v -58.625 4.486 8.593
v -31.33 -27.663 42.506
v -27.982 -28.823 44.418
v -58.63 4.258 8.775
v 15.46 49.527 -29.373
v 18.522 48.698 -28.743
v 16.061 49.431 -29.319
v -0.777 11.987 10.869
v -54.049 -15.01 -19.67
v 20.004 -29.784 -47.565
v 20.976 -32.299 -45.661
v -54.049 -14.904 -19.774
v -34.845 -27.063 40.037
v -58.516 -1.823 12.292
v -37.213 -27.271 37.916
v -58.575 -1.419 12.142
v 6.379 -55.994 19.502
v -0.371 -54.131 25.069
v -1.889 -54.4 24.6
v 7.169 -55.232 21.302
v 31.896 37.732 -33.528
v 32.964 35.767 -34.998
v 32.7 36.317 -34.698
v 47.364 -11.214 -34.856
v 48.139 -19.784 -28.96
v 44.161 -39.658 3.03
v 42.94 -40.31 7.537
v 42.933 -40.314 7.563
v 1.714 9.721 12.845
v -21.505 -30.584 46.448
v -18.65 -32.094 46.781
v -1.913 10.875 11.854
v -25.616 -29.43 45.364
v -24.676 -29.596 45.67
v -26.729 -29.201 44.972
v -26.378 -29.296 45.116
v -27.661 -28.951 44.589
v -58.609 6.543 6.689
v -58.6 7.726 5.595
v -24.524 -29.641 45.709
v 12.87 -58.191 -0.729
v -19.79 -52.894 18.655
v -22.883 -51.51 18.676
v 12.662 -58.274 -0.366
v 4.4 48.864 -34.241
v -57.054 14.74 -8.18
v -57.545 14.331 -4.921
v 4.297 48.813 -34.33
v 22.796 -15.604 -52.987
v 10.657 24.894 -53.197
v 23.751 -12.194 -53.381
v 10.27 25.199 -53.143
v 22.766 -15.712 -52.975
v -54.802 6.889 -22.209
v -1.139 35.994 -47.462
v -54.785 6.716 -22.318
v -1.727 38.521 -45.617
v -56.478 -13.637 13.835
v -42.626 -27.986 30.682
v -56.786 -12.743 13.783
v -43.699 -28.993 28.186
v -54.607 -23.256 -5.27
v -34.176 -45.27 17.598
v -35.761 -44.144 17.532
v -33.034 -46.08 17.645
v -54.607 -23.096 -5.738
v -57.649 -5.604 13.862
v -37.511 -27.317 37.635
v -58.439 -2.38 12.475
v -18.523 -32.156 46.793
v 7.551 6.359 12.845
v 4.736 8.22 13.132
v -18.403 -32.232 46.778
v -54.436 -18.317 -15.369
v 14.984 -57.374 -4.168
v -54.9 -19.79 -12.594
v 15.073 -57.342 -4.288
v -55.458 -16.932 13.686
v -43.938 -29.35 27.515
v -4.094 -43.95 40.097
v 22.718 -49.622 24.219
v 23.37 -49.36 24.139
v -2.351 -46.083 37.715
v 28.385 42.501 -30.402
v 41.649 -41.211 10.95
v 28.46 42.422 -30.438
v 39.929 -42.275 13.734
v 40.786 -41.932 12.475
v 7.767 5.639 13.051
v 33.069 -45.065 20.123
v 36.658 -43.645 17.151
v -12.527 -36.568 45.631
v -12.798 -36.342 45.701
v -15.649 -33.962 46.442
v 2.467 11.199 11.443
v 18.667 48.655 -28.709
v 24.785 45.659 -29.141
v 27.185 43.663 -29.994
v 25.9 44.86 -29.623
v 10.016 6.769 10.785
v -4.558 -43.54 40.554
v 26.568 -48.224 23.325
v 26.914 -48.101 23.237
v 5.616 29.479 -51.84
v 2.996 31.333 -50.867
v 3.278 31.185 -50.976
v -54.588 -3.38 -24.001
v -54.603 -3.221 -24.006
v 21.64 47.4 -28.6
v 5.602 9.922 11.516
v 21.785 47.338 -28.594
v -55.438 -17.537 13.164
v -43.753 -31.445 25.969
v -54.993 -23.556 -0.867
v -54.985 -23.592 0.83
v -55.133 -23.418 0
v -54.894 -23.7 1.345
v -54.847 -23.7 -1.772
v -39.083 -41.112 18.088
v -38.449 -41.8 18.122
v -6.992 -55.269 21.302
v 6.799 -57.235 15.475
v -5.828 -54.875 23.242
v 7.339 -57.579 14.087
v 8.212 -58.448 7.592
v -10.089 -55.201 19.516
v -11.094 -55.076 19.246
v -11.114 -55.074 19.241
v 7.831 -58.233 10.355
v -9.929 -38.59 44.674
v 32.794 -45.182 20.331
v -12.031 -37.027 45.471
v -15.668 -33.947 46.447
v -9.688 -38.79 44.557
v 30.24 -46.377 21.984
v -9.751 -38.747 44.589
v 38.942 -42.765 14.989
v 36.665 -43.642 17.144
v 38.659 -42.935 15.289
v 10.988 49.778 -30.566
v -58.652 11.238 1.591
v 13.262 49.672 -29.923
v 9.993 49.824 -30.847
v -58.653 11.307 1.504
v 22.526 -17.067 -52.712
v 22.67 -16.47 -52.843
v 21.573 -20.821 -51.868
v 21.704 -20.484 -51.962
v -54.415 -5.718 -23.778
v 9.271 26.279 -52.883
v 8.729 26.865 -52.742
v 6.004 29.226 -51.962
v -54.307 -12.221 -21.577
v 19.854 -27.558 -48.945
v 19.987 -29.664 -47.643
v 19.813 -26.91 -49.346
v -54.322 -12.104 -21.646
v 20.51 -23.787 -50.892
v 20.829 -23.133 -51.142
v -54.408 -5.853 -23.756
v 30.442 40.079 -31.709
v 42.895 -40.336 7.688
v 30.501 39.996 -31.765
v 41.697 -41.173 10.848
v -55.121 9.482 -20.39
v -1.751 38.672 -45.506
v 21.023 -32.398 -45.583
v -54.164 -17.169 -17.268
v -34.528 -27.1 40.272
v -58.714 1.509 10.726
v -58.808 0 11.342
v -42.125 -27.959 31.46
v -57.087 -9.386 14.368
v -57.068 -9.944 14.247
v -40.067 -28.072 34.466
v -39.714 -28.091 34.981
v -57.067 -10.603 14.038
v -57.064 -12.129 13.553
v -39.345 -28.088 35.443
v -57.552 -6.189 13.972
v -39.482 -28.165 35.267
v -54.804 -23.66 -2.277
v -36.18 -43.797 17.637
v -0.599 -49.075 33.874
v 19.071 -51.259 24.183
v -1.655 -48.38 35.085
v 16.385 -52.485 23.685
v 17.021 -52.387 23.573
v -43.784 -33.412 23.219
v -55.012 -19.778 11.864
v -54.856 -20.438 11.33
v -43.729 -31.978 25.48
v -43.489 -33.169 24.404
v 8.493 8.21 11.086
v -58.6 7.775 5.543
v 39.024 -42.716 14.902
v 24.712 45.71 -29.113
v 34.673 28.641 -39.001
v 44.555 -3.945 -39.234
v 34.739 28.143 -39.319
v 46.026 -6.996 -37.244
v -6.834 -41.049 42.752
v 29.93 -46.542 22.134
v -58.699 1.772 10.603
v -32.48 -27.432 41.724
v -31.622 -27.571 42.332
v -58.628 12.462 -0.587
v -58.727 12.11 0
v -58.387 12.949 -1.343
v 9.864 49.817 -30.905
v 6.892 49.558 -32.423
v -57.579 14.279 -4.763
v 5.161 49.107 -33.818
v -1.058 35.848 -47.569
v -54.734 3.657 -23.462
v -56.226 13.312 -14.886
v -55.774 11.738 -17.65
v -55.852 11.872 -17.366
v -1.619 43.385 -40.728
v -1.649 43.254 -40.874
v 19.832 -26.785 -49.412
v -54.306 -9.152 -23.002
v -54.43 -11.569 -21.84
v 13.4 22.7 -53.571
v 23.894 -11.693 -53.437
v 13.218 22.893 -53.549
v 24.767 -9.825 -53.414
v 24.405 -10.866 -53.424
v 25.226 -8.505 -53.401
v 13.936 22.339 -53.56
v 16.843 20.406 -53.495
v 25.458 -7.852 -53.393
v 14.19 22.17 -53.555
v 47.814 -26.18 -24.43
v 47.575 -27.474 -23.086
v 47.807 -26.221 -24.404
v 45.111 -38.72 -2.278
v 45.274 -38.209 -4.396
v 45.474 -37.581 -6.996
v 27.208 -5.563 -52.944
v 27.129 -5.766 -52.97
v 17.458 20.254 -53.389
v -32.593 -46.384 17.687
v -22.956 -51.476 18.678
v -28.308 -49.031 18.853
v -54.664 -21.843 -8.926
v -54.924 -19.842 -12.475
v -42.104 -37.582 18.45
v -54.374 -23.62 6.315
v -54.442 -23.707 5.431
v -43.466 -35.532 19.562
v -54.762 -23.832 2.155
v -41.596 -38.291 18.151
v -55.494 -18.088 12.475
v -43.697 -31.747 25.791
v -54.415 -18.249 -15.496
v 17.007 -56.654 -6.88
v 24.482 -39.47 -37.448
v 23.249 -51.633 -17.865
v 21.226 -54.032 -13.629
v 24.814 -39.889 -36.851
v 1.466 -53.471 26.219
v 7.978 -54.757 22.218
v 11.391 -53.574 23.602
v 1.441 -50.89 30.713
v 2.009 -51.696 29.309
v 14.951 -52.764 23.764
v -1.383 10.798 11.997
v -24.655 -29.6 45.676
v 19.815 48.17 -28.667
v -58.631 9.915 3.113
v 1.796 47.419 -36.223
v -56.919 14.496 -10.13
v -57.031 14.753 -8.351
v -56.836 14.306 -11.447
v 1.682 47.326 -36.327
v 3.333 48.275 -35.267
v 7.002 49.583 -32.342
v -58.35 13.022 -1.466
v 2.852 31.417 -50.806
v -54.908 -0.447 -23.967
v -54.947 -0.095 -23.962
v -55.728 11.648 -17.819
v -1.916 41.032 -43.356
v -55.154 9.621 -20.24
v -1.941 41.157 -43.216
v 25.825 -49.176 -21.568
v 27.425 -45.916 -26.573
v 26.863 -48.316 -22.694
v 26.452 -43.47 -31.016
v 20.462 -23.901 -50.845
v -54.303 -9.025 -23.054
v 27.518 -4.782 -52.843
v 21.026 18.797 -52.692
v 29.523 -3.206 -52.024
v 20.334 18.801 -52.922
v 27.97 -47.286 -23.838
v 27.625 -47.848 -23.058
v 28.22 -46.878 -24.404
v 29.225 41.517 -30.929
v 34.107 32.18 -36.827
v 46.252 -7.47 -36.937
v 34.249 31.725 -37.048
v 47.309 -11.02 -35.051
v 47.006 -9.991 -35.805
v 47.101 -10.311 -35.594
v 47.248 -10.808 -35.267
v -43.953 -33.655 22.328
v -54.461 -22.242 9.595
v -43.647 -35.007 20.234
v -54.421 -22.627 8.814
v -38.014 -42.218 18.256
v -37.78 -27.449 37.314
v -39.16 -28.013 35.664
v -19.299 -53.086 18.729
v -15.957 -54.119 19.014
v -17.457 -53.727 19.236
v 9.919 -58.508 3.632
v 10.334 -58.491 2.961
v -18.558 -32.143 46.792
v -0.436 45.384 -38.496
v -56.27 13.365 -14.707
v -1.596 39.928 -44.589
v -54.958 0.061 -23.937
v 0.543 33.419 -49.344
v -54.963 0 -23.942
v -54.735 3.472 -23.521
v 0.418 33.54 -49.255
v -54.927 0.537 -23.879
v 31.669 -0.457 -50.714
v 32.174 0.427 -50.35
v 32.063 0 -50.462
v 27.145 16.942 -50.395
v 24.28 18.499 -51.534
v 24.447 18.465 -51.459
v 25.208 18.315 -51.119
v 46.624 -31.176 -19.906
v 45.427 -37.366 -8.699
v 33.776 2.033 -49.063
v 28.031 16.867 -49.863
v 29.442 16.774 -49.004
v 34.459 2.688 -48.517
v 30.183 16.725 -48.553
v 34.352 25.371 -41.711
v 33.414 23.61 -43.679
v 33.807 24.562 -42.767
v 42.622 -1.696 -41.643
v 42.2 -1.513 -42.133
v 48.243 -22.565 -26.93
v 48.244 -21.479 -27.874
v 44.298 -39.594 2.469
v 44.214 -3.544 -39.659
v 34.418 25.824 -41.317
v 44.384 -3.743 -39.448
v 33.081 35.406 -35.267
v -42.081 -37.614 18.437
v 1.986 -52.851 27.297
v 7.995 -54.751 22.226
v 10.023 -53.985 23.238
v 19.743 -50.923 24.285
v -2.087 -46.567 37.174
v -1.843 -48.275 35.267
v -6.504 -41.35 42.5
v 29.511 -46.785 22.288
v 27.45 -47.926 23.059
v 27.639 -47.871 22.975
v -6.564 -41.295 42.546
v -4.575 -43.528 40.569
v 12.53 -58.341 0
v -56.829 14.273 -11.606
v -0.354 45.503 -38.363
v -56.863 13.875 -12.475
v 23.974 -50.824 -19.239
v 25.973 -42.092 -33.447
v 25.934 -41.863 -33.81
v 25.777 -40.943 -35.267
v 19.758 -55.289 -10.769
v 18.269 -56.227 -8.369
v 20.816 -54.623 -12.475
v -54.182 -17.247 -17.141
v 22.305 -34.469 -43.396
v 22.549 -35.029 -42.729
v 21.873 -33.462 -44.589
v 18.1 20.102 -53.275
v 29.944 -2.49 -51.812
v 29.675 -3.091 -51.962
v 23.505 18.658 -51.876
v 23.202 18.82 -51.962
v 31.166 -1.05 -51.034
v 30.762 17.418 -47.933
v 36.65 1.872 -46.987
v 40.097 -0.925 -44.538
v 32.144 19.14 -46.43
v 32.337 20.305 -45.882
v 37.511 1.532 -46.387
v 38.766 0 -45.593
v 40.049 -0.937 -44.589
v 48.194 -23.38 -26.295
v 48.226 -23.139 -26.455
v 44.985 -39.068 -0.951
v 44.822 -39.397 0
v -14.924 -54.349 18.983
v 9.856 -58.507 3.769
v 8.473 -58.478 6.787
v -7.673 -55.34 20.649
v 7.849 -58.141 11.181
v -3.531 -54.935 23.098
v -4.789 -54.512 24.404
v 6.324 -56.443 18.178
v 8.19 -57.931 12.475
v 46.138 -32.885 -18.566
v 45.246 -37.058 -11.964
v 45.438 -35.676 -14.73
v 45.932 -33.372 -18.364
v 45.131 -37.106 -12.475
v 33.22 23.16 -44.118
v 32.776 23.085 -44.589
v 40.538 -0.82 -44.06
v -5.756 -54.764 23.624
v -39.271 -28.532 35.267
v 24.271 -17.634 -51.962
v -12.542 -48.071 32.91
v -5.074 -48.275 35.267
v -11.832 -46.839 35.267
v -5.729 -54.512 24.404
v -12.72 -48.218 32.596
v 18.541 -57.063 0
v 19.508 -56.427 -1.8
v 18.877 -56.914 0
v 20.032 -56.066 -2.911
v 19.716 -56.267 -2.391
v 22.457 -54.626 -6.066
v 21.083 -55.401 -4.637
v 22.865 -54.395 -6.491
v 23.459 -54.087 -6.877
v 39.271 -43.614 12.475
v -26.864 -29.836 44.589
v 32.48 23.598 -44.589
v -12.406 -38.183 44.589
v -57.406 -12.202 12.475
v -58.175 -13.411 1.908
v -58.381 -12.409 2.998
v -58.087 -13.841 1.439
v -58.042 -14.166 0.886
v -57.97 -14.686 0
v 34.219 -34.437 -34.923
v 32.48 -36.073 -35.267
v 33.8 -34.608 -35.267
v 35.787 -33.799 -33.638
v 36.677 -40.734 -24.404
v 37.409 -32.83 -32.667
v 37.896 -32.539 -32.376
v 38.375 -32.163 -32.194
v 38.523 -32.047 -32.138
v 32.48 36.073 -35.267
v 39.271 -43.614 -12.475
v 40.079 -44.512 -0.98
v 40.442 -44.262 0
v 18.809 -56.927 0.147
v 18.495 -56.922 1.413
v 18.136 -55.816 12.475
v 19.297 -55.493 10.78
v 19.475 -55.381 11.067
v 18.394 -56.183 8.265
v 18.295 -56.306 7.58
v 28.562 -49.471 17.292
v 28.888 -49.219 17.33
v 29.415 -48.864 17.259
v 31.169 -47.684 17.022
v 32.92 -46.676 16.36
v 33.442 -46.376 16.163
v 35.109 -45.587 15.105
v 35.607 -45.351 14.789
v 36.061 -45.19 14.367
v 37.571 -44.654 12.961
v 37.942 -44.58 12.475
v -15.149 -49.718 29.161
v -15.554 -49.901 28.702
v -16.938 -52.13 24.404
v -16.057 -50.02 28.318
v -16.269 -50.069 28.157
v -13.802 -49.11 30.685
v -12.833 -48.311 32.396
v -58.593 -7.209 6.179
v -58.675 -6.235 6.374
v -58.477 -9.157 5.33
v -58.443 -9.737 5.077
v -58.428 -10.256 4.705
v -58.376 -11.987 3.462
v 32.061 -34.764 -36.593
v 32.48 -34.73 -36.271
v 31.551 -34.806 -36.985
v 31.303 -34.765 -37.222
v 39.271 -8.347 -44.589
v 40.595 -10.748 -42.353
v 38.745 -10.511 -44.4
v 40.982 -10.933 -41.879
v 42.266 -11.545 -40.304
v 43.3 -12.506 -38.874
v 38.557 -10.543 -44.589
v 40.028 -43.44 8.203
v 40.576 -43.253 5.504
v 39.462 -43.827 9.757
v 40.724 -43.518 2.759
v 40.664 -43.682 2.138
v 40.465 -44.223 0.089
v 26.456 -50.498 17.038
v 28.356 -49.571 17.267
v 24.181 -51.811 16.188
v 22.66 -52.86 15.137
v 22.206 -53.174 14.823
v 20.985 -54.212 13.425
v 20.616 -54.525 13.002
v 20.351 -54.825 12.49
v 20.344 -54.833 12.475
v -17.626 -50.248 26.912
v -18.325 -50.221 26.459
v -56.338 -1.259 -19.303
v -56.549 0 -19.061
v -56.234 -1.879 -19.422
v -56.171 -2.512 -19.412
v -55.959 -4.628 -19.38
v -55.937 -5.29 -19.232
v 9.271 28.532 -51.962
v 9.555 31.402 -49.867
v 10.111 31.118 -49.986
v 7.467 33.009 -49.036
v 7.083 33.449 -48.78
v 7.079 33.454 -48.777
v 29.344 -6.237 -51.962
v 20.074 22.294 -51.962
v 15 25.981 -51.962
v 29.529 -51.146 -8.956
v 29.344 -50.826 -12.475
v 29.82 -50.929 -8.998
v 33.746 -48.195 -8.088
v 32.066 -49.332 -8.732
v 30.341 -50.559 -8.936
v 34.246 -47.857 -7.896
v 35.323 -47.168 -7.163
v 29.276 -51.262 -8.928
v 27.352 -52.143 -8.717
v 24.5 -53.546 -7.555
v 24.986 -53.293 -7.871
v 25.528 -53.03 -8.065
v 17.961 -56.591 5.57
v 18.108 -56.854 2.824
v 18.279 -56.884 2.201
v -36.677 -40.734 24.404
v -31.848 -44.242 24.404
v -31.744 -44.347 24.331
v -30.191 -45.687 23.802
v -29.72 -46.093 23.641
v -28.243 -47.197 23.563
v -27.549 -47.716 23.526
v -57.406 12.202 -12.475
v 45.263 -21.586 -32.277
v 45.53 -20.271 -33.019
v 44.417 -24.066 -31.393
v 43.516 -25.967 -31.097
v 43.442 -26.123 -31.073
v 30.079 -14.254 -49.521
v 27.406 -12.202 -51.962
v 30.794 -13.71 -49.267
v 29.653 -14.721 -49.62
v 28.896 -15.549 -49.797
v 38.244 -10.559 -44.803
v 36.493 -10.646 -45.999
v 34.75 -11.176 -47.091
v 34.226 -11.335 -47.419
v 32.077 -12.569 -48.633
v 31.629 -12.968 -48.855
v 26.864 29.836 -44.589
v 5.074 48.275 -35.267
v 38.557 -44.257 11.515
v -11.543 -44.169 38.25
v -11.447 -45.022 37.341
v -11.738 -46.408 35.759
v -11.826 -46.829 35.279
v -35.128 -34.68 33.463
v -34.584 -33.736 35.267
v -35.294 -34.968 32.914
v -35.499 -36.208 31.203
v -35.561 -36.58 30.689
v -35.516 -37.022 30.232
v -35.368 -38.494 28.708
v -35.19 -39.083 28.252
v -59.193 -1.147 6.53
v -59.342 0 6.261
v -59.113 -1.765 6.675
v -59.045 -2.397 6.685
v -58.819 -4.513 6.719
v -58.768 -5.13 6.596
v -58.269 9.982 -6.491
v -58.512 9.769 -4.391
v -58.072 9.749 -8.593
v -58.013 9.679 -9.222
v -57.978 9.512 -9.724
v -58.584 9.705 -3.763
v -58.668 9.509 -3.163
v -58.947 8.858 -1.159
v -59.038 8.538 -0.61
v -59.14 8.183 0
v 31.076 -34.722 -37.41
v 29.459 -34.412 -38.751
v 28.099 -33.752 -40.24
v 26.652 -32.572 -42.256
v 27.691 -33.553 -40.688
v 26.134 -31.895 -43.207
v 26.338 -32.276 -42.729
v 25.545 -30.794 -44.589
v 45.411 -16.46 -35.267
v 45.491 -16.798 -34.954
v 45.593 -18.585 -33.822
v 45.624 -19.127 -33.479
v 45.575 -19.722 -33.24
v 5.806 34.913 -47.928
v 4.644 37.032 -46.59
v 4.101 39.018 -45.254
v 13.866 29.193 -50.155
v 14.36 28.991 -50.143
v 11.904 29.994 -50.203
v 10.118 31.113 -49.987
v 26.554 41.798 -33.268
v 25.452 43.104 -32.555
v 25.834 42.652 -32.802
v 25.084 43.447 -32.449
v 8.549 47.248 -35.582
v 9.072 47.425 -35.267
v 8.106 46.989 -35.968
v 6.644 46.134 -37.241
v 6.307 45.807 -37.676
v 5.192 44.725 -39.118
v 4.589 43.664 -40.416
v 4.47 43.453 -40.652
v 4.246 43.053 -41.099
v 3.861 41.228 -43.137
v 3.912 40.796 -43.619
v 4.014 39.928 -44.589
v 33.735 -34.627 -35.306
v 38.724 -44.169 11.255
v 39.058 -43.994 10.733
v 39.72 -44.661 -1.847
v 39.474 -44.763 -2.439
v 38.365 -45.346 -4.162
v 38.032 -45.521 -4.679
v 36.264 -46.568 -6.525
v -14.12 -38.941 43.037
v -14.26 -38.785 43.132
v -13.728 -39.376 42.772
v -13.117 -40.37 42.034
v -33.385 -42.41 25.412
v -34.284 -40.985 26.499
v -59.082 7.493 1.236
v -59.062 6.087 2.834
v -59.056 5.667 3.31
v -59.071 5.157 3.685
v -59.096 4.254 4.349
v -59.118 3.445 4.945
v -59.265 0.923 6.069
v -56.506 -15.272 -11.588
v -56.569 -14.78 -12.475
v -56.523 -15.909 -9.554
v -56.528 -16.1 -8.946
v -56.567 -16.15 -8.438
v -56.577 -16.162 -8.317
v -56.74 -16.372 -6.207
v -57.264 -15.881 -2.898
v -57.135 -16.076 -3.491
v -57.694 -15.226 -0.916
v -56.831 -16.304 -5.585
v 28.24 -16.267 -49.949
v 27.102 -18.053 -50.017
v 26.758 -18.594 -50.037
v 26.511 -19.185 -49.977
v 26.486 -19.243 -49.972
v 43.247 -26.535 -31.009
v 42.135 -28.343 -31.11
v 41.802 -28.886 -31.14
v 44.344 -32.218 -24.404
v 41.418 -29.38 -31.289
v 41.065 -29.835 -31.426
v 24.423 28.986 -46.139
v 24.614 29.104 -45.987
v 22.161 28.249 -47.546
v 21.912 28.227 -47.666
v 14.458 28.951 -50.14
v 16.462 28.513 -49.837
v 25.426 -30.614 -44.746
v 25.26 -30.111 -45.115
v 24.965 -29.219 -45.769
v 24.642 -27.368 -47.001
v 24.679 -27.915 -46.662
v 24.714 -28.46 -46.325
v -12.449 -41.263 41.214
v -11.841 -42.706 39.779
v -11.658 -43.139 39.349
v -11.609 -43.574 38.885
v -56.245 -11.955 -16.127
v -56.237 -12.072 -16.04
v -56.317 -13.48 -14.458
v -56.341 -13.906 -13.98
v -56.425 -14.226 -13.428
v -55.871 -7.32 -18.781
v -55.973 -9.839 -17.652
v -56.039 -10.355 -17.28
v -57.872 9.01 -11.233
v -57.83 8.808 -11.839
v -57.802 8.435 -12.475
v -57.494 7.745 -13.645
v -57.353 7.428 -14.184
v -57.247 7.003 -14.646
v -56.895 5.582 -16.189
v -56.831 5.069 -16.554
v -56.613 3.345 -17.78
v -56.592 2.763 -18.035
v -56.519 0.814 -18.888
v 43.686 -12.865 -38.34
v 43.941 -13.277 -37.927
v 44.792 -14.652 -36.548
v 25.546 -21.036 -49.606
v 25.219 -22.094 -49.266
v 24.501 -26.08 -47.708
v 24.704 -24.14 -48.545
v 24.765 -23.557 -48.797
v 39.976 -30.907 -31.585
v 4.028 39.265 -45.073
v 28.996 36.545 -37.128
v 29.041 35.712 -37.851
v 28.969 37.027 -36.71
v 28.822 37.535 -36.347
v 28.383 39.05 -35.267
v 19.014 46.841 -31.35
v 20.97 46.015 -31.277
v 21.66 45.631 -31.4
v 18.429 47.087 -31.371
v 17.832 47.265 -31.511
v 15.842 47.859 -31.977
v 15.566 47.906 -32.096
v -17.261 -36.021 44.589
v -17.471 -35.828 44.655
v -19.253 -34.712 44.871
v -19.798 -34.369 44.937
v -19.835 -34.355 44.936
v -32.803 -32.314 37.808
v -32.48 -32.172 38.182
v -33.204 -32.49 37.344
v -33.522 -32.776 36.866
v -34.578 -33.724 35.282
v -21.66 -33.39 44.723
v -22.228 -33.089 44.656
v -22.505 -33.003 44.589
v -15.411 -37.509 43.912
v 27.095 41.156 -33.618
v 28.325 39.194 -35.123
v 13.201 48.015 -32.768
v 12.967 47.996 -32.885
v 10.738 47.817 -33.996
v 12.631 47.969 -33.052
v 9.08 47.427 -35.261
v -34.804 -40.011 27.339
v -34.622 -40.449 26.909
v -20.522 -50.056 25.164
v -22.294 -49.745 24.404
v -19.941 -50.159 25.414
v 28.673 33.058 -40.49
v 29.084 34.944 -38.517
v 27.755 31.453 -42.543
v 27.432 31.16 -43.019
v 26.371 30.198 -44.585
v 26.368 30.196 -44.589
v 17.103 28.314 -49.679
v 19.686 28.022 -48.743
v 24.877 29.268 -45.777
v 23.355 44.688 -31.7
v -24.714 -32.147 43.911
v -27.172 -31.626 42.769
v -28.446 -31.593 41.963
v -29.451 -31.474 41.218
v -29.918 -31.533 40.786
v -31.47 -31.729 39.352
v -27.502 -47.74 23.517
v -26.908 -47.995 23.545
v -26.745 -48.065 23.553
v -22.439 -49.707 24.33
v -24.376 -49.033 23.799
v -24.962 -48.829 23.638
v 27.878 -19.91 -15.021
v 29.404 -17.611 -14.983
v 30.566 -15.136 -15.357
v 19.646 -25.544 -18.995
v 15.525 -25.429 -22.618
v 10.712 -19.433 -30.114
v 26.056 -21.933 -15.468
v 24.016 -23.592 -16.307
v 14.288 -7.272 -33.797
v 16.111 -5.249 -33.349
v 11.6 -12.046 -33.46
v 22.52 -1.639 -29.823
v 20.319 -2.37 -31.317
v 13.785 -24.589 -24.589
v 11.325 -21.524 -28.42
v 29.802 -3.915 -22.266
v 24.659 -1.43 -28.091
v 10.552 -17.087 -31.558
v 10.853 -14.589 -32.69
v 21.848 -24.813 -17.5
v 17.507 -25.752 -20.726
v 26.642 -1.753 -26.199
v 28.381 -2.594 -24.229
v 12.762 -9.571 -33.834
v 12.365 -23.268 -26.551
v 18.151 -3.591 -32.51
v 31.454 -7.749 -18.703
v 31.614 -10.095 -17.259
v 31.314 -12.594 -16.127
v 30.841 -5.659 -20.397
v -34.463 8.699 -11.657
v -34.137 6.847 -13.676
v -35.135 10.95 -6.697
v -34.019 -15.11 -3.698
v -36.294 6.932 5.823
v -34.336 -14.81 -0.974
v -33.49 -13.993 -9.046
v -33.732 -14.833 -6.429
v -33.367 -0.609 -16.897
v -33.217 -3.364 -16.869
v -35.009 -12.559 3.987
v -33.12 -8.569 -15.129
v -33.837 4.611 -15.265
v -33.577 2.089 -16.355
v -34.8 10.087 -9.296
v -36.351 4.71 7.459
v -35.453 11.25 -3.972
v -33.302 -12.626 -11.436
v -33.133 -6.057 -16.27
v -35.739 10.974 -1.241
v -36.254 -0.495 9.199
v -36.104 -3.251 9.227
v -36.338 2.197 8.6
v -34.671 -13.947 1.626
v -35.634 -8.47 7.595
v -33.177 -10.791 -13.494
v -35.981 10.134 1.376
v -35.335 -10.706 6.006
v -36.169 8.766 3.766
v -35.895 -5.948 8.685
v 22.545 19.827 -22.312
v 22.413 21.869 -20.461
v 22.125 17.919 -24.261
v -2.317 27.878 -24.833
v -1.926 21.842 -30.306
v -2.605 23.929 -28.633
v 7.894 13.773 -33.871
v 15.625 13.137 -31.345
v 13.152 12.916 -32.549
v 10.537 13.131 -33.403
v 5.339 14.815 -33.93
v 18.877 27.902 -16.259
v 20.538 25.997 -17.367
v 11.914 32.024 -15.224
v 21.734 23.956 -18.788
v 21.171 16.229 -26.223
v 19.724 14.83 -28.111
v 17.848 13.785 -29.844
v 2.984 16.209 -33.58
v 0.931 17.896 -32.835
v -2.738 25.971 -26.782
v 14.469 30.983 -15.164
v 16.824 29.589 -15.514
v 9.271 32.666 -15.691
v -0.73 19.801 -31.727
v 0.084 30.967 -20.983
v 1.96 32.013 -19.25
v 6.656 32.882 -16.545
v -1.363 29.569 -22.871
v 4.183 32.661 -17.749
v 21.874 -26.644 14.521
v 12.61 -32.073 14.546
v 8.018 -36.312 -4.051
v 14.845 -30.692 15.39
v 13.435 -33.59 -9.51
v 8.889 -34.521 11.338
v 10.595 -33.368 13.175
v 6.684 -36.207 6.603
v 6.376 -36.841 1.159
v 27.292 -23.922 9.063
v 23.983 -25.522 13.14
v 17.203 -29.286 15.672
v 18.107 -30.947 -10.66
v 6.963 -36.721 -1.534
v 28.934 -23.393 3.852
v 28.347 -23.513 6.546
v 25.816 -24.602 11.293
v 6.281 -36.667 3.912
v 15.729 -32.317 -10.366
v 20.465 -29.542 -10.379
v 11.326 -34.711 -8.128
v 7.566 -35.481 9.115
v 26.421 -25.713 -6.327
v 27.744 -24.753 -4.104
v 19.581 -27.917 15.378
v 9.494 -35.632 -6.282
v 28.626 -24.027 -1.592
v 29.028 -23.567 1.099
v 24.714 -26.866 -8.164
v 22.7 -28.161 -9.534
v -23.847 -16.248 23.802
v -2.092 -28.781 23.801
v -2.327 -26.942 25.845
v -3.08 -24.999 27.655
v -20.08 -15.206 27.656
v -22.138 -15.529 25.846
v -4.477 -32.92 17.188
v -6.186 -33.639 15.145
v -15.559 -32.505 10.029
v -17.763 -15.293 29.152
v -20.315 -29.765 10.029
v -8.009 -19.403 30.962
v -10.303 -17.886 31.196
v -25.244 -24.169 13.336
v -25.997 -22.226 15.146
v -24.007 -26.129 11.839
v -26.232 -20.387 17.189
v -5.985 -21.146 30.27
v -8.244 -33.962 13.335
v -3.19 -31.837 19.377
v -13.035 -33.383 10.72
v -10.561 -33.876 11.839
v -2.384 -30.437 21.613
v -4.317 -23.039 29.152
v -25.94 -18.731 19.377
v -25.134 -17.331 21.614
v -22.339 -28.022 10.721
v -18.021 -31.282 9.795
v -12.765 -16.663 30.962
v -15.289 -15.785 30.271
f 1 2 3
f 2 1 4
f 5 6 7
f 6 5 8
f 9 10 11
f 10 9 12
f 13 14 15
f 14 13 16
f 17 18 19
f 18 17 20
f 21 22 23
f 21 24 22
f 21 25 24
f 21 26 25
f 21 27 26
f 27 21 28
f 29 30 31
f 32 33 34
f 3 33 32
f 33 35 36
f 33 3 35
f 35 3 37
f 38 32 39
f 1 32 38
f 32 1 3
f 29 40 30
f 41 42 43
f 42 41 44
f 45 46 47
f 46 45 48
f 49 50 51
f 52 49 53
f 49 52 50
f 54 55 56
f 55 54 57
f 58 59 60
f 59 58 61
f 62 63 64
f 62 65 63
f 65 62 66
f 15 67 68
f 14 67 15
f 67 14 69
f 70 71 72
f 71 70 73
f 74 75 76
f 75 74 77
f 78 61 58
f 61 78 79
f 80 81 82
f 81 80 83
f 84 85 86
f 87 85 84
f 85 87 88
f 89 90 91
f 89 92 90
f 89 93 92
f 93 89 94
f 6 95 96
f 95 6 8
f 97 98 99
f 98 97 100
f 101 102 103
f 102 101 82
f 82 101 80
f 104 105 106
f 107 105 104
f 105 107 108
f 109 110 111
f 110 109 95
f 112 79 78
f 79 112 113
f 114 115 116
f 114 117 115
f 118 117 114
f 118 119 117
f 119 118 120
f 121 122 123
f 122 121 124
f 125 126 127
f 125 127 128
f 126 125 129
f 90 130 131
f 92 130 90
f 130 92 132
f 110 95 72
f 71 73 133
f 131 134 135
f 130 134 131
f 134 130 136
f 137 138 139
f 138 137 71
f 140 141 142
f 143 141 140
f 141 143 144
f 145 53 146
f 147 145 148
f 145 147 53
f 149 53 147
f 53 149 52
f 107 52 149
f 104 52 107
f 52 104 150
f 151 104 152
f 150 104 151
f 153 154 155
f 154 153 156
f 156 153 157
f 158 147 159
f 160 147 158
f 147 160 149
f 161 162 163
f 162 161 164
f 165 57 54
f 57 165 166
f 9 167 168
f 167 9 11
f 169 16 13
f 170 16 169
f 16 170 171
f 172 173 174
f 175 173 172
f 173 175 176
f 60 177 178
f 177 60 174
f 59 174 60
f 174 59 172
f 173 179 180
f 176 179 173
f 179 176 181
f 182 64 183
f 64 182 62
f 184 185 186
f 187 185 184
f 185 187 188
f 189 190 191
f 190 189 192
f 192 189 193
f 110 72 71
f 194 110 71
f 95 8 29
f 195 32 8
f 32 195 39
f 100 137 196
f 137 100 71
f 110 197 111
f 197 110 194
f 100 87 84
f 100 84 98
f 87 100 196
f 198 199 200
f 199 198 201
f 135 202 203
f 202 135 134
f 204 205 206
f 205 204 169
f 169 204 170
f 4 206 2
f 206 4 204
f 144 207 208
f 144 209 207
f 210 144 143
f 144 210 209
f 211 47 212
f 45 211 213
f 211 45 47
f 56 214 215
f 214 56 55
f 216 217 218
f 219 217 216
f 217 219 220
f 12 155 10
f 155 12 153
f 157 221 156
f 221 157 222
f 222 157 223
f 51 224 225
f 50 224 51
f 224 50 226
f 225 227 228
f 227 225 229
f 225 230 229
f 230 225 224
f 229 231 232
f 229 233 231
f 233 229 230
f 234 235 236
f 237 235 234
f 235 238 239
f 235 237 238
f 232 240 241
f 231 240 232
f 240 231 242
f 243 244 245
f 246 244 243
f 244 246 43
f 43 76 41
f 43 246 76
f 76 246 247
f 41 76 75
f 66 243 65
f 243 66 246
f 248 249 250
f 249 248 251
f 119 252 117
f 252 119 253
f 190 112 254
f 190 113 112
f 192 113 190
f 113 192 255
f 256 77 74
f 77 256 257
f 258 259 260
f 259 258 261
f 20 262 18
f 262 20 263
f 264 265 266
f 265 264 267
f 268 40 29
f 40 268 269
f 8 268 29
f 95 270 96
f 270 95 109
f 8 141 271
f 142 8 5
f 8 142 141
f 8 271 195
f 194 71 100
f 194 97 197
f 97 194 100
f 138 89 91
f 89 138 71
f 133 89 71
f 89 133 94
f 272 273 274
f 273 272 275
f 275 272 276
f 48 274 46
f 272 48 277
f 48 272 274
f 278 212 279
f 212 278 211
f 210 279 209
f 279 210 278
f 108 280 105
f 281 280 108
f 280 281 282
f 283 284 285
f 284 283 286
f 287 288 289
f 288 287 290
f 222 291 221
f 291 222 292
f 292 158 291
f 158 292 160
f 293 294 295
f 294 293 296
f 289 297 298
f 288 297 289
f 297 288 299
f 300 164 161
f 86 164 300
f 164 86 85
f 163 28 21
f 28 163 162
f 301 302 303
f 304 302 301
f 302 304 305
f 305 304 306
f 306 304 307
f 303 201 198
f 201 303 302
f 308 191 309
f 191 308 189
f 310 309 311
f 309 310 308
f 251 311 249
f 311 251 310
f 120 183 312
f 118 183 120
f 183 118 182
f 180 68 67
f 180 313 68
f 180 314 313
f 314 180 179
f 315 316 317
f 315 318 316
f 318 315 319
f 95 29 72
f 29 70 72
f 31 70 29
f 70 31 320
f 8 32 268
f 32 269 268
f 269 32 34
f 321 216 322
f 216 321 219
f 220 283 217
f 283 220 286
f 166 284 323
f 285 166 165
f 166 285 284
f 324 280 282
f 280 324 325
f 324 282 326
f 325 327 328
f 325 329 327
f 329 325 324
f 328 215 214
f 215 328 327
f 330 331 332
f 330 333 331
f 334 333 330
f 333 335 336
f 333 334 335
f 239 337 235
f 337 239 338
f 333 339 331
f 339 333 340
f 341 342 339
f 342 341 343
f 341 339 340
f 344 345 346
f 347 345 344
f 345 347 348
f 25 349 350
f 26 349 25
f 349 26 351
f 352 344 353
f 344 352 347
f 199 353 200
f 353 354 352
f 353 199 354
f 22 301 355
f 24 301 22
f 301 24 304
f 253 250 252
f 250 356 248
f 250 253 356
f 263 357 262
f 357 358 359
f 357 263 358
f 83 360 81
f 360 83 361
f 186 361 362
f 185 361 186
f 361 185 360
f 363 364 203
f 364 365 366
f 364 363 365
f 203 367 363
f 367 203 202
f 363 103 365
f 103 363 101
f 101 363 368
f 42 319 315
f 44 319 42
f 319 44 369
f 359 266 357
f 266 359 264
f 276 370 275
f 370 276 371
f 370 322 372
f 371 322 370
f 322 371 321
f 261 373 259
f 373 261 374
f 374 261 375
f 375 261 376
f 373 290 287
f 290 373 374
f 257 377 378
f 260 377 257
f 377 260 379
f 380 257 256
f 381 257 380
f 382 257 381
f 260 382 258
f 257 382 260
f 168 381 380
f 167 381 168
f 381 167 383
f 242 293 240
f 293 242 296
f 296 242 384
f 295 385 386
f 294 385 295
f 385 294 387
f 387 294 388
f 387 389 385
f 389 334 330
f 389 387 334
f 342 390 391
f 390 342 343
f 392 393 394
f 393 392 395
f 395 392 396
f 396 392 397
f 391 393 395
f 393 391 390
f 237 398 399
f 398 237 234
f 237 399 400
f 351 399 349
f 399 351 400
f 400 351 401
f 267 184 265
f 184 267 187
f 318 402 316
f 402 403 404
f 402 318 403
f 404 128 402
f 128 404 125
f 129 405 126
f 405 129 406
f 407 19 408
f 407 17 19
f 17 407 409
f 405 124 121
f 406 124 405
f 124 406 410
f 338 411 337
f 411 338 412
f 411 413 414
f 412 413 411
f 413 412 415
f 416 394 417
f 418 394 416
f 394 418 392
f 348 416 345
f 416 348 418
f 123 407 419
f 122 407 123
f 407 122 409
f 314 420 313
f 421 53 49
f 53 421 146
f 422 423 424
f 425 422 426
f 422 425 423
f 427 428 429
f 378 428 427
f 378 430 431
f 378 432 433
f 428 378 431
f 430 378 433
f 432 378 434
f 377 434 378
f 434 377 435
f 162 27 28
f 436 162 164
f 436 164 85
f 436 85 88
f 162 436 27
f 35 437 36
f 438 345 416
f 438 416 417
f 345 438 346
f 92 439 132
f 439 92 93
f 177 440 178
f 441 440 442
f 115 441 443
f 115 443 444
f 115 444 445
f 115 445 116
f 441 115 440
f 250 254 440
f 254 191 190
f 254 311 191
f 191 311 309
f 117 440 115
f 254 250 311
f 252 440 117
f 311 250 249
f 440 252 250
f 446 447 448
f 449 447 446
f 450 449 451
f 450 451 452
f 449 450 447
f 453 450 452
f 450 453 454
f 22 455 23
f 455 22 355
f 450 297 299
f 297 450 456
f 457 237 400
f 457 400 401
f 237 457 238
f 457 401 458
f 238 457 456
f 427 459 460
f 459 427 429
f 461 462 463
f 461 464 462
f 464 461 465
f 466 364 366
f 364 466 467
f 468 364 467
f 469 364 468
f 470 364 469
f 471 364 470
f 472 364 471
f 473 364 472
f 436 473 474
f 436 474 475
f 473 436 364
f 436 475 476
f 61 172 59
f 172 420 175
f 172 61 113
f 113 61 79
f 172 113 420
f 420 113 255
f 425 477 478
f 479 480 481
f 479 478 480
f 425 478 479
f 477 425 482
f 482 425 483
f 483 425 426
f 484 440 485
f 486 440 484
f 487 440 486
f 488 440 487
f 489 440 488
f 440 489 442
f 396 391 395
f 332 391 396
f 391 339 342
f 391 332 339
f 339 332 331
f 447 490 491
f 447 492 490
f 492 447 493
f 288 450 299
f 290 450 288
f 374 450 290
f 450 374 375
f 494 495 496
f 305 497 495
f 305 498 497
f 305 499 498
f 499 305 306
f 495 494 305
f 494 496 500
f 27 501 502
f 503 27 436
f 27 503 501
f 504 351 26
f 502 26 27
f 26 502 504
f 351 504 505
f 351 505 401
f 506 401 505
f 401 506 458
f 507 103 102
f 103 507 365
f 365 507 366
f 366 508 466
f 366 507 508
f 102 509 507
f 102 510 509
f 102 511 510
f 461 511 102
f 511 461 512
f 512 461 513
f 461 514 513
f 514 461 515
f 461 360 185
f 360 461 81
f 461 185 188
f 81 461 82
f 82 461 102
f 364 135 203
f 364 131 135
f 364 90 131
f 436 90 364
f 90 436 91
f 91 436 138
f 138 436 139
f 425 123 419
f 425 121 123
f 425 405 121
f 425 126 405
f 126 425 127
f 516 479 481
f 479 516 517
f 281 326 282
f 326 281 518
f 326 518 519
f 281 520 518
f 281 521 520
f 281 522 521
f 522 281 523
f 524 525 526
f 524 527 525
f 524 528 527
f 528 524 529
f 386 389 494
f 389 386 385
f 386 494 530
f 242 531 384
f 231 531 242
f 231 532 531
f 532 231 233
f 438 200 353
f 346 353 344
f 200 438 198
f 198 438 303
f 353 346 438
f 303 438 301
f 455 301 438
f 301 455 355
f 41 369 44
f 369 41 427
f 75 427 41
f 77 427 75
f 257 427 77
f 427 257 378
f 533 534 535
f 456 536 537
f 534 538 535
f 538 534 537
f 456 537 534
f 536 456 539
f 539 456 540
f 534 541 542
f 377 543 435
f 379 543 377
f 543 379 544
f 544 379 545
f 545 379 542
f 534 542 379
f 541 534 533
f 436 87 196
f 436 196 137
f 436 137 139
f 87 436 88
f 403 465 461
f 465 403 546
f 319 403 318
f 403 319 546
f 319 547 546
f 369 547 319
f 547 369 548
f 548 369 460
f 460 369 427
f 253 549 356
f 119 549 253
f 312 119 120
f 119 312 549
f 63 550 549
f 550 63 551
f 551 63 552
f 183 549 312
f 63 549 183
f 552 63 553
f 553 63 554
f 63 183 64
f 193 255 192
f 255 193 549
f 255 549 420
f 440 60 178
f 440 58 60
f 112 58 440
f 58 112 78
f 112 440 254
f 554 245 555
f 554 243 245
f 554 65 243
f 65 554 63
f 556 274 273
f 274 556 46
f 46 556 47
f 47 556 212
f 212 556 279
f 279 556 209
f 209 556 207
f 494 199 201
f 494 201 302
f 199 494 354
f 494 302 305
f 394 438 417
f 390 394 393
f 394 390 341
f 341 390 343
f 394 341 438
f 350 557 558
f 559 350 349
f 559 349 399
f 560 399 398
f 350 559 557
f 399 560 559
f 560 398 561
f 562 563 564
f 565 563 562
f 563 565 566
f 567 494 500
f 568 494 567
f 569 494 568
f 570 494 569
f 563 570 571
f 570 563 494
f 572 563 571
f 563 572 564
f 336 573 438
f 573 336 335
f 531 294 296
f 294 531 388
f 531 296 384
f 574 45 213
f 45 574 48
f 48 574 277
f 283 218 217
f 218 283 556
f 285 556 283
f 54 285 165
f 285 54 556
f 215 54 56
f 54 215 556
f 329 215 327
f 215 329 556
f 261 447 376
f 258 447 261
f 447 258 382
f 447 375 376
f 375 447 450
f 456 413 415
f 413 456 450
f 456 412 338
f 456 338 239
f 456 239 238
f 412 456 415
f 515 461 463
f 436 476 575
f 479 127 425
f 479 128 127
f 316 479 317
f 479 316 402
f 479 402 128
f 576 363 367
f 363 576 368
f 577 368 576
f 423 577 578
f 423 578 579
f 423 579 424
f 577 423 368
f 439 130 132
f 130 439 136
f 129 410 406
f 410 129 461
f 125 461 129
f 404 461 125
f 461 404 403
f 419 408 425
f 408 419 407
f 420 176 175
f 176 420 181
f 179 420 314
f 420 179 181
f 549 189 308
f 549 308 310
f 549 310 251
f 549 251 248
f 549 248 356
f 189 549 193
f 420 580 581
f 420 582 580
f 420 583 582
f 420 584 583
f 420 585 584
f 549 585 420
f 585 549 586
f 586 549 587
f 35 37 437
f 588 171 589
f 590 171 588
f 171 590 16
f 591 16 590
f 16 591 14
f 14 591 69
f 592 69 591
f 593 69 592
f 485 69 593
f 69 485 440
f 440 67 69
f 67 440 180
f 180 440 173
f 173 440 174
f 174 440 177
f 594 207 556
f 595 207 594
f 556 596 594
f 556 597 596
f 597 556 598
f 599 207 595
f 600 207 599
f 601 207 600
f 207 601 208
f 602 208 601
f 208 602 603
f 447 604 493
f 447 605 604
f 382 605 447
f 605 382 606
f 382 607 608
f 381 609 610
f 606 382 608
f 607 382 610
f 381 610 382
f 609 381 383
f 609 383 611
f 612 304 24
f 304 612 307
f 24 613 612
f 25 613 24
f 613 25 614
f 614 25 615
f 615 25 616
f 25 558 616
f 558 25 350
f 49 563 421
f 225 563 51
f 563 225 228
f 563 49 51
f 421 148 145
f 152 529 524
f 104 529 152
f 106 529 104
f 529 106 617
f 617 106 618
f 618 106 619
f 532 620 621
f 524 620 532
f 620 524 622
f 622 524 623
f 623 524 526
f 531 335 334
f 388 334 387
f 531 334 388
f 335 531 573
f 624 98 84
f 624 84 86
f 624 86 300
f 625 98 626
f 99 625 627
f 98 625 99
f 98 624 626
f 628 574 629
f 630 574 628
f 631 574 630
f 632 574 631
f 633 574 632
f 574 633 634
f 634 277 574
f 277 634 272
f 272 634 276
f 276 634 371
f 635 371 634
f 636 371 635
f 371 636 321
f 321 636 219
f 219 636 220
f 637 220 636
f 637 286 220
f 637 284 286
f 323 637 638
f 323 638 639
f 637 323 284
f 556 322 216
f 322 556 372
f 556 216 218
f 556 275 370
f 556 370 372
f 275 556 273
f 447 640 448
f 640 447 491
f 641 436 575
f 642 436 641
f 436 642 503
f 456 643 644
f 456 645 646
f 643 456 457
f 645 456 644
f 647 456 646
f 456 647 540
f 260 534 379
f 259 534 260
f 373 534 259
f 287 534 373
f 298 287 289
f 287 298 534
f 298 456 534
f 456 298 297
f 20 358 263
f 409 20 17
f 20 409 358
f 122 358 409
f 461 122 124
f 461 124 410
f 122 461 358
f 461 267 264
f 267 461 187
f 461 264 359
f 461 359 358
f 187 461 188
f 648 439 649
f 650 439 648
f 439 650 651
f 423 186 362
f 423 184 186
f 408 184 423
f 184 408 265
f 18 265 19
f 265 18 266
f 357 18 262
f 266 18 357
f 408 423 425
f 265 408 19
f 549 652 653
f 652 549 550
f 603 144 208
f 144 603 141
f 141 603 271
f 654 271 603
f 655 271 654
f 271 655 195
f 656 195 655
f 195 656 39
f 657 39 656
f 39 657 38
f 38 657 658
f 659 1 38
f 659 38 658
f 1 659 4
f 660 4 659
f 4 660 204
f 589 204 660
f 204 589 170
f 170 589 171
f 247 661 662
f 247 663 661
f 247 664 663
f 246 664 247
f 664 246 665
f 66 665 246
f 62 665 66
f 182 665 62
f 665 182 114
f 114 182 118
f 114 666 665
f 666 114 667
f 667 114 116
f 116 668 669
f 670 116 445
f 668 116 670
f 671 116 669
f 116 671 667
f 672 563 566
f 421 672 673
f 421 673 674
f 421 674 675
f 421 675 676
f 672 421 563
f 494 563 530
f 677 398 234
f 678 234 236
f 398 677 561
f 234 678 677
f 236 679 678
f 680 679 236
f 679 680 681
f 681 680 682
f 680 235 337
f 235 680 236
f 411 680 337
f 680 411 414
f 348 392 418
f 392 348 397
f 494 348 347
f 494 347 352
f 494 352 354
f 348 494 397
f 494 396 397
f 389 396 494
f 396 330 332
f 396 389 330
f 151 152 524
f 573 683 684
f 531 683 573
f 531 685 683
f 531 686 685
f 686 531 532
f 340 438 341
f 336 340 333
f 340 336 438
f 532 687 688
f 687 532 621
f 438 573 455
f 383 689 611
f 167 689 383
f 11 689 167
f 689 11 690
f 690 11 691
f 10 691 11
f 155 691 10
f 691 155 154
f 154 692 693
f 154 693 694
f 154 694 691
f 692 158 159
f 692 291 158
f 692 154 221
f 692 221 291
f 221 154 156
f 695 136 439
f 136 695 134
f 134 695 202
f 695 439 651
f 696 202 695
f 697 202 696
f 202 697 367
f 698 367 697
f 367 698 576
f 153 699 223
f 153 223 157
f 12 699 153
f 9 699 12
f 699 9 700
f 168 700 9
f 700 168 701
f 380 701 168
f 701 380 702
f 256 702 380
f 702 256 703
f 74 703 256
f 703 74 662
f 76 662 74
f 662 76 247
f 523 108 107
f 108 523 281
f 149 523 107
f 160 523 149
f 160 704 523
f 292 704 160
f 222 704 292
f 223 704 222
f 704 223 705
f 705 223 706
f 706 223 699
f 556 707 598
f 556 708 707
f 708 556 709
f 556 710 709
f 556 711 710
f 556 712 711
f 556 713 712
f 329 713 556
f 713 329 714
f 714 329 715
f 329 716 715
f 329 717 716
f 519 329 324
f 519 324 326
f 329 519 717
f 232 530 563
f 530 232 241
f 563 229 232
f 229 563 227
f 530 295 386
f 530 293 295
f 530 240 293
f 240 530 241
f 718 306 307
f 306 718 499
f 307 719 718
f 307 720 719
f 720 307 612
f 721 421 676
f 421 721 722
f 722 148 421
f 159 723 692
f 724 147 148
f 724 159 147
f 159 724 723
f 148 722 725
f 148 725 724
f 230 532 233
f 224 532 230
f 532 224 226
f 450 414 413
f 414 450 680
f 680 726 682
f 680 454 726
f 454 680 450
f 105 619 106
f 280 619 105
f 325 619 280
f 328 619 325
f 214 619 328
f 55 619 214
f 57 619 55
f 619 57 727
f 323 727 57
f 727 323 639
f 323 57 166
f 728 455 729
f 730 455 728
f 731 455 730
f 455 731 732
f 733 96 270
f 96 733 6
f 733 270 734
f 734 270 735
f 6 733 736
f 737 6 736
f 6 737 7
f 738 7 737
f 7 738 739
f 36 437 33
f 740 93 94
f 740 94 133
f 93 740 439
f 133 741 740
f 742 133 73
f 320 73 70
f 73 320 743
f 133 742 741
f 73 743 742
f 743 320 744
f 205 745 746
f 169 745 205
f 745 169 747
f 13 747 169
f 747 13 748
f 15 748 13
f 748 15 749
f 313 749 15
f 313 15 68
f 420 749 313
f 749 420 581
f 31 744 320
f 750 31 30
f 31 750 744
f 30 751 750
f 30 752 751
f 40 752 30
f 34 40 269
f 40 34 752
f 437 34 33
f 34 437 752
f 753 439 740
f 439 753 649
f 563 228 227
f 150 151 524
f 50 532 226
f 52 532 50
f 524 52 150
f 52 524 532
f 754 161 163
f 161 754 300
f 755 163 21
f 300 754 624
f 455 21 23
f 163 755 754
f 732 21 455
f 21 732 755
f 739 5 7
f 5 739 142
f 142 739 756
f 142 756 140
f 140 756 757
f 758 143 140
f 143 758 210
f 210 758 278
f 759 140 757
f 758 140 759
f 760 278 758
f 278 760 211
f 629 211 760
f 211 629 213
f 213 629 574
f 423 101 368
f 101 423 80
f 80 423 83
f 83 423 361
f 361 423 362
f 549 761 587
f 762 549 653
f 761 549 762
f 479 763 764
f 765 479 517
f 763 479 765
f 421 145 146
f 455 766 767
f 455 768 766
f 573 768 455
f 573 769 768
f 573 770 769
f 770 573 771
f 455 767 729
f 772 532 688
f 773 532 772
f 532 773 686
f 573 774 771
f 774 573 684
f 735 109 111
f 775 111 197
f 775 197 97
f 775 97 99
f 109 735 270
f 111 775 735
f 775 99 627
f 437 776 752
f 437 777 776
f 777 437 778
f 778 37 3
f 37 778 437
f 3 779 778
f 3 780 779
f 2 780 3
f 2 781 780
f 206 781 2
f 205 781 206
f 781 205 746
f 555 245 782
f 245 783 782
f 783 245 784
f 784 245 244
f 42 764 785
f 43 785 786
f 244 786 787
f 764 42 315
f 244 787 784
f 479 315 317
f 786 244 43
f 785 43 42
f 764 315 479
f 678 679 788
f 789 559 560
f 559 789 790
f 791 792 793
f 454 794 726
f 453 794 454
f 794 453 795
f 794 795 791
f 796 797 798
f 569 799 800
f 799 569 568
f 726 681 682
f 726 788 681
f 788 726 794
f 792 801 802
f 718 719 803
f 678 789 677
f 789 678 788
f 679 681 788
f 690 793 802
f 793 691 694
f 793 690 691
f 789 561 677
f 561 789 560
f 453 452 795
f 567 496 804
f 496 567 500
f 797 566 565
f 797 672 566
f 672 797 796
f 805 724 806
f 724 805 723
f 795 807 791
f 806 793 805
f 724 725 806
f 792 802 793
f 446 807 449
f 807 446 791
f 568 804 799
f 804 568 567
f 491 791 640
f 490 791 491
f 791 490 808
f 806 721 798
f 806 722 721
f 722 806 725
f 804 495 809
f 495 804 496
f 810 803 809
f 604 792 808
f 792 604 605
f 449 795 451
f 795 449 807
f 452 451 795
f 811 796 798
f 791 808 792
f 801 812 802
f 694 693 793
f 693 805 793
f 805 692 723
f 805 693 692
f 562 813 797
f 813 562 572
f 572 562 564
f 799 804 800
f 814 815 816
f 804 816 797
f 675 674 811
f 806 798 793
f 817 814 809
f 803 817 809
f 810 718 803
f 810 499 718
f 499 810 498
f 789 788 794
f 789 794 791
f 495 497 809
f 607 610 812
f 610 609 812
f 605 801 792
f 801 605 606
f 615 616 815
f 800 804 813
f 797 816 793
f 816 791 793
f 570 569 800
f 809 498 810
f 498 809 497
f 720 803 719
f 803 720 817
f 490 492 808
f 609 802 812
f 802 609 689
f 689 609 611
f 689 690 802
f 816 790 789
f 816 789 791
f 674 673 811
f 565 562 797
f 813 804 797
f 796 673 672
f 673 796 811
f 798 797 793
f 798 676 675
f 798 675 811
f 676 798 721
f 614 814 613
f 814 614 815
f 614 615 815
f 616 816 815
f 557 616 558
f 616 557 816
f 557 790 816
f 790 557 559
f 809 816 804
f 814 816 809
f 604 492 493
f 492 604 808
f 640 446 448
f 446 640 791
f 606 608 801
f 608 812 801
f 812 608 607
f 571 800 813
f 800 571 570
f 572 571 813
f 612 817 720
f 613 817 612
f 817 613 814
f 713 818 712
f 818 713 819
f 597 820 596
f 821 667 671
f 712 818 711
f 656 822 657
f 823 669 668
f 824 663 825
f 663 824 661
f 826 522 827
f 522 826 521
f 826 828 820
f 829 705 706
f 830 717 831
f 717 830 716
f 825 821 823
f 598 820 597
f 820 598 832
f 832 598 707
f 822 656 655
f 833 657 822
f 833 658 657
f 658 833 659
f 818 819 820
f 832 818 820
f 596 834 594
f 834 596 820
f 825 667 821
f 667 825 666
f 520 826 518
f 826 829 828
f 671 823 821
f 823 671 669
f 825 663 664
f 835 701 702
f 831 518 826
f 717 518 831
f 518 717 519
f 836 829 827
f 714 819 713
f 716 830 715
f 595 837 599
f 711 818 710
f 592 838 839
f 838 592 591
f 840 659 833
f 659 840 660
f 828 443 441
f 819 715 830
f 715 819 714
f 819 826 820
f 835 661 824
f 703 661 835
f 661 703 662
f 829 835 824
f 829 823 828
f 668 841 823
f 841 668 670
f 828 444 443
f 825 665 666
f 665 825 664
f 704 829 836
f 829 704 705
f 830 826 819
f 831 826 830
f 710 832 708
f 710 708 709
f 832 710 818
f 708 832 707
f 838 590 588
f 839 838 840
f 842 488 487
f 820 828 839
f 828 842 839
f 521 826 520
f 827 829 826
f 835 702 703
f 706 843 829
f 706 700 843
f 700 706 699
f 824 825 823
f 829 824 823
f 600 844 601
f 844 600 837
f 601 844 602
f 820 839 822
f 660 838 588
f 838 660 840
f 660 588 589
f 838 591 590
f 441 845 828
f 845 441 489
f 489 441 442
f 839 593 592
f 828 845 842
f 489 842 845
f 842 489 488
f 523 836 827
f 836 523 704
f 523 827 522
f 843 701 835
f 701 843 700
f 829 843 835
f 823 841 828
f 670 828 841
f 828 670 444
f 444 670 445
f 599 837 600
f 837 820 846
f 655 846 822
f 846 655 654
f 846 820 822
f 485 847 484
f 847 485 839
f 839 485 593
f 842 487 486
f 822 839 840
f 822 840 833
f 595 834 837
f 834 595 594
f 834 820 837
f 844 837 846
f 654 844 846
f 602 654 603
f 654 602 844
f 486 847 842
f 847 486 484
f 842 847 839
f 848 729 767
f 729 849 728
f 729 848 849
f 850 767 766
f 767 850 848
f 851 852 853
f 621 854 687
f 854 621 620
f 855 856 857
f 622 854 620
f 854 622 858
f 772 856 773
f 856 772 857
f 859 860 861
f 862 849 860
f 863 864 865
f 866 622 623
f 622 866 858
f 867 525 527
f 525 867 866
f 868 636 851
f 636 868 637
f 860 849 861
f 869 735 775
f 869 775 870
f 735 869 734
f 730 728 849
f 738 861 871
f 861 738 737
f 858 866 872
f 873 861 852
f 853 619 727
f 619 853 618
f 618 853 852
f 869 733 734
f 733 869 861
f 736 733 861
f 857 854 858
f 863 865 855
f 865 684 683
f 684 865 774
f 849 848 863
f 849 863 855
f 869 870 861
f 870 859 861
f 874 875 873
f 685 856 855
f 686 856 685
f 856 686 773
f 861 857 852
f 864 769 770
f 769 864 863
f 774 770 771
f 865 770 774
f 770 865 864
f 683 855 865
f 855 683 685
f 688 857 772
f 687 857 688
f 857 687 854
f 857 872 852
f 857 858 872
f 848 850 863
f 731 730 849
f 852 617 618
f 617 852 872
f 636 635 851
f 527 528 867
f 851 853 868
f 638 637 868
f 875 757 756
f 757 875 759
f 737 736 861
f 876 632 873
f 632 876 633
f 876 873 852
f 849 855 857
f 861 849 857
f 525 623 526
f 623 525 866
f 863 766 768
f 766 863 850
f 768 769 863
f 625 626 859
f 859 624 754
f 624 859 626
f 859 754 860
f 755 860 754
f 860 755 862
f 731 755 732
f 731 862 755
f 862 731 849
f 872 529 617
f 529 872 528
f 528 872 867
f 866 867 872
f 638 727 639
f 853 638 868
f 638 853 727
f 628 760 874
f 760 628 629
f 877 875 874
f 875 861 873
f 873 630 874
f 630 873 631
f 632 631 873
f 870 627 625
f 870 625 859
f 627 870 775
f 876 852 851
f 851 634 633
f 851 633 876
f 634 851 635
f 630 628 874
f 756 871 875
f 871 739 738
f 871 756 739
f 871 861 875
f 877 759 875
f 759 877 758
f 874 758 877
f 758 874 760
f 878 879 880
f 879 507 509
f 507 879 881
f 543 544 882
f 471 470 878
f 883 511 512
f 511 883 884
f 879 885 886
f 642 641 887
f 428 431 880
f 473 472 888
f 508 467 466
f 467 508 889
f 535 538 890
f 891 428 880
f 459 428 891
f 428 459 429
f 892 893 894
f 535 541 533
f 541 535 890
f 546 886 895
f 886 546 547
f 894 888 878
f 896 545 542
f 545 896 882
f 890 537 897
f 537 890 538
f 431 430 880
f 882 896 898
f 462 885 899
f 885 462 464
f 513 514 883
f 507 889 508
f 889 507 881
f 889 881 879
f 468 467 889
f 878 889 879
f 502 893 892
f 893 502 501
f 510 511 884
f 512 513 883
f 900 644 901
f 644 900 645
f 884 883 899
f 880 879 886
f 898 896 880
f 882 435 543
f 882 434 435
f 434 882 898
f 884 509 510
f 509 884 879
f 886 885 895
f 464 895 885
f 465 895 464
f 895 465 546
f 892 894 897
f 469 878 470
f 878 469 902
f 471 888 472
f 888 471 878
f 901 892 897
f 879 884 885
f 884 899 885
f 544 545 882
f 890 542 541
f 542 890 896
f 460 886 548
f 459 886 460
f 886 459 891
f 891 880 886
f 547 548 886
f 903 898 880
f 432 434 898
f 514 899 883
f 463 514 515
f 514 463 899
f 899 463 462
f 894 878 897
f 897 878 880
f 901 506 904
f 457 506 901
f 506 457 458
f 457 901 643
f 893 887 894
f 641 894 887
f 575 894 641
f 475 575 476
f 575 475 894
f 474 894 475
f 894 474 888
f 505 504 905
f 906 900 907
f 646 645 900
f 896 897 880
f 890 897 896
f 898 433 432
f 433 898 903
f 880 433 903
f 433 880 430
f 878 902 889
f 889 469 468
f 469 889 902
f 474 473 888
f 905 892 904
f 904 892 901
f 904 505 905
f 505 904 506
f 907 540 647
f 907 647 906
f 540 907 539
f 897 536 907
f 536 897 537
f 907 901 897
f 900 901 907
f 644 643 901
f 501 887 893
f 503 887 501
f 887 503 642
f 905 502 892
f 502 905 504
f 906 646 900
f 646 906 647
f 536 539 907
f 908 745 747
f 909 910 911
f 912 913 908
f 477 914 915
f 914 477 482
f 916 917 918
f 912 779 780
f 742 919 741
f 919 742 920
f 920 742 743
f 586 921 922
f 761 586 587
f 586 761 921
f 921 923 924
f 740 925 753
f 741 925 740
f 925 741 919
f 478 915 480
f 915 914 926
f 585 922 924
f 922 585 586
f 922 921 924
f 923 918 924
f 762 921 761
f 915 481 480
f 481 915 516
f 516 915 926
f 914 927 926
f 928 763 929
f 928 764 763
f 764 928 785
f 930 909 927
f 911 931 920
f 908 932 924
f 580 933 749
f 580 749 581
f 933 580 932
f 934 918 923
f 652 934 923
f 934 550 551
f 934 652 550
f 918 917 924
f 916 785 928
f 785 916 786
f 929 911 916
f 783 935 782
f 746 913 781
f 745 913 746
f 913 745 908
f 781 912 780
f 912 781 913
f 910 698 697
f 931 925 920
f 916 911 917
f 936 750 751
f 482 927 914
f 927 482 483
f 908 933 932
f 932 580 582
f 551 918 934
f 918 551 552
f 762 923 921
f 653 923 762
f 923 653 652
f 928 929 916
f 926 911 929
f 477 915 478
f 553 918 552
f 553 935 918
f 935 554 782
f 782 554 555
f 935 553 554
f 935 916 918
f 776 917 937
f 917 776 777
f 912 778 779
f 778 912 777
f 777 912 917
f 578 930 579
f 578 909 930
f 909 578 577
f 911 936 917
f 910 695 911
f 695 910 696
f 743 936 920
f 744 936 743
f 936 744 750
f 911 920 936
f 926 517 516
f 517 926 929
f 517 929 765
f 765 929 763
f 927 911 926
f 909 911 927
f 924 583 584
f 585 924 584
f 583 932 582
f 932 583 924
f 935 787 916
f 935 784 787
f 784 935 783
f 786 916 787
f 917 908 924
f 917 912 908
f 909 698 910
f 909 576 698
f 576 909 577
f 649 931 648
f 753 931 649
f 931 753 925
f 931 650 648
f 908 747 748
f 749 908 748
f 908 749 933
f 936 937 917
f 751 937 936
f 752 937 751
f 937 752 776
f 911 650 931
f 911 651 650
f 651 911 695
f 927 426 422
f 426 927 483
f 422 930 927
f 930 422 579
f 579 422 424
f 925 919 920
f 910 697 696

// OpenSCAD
difference() {
	intersection() {
		hull() {
			rotate(a = -118.9051365199, v = [0.8754084129, -0.0047311662, 0.0000000000]) {
				rotate(a = -90.0000000000, v = [0.7933533403, -0.6087614290, 0.0000000000]) {
					cylinder(h = 60, r = 16.2000000000);
				}
			}
			rotate(a = -118.9051365199, v = [0.8754084129, -0.0047311662, 0.0000000000]) {
				rotate(a = -90.0000000000, v = [0.1305261922, 0.9914448614, -0.0000000000]) {
					cylinder(h = 60, r = 16.2000000000);
				}
			}
			rotate(a = -118.9051365199, v = [0.8754084129, -0.0047311662, 0.0000000000]) {
				rotate(a = -24.0657434263, v = [0.2954832486, -0.2810301414, 0.0000000000]) {
					cylinder(h = 60, r = 16.2000000000);
				}
			}
			rotate(a = -118.9051365199, v = [0.8754084129, -0.0047311662, 0.0000000000]) {
				rotate(a = -141.7661142776, v = [0.3491712756, -0.5109630911, 0.0000000000]) {
					cylinder(h = 60, r = 16.2000000000);
				}
			}
			rotate(a = -118.9051365199, v = [0.8754084129, -0.0047311662, 0.0000000000]) {
				rotate(a = -154.1384175201, v = [-0.1698982562, 0.4017508387, 0.0000000000]) {
					cylinder(h = 60, r = 16.2000000000);
				}
			}
		}
		sphere(r = 60);
	}
	union() {
		rotate(a = -118.9051365199, v = [0.8754084129, -0.0047311662, 0.0000000000]) {
			rotate(a = -90.0000000000, v = [0.7933533403, -0.6087614290, 0.0000000000]) {
				translate(v = [0, 0, 35]) {
					cylinder(h = 100, r = 13.2000000000);
				}
			}
		}
		rotate(a = -118.9051365199, v = [0.8754084129, -0.0047311662, 0.0000000000]) {
			rotate(a = -90.0000000000, v = [0.1305261922, 0.9914448614, -0.0000000000]) {
				translate(v = [0, 0, 35]) {
					cylinder(h = 100, r = 13.2000000000);
				}
			}
		}
		rotate(a = -118.9051365199, v = [0.8754084129, -0.0047311662, 0.0000000000]) {
			rotate(a = -24.0657434263, v = [0.2954832486, -0.2810301414, 0.0000000000]) {
				translate(v = [0, 0, 35]) {
					cylinder(h = 100, r = 13.2000000000);
				}
			}
		}
		rotate(a = -118.9051365199, v = [0.8754084129, -0.0047311662, 0.0000000000]) {
			rotate(a = -141.7661142776, v = [0.3491712756, -0.5109630911, 0.0000000000]) {
				translate(v = [0, 0, 35]) {
					cylinder(h = 100, r = 13.2000000000);
				}
			}
		}
		rotate(a = -118.9051365199, v = [0.8754084129, -0.0047311662, 0.0000000000]) {
			rotate(a = -154.1384175201, v = [-0.1698982562, 0.4017508387, 0.0000000000]) {
				translate(v = [0, 0, 35]) {
					cylinder(h = 100, r = 13.2000000000);
				}
			}
		}
	}
}
